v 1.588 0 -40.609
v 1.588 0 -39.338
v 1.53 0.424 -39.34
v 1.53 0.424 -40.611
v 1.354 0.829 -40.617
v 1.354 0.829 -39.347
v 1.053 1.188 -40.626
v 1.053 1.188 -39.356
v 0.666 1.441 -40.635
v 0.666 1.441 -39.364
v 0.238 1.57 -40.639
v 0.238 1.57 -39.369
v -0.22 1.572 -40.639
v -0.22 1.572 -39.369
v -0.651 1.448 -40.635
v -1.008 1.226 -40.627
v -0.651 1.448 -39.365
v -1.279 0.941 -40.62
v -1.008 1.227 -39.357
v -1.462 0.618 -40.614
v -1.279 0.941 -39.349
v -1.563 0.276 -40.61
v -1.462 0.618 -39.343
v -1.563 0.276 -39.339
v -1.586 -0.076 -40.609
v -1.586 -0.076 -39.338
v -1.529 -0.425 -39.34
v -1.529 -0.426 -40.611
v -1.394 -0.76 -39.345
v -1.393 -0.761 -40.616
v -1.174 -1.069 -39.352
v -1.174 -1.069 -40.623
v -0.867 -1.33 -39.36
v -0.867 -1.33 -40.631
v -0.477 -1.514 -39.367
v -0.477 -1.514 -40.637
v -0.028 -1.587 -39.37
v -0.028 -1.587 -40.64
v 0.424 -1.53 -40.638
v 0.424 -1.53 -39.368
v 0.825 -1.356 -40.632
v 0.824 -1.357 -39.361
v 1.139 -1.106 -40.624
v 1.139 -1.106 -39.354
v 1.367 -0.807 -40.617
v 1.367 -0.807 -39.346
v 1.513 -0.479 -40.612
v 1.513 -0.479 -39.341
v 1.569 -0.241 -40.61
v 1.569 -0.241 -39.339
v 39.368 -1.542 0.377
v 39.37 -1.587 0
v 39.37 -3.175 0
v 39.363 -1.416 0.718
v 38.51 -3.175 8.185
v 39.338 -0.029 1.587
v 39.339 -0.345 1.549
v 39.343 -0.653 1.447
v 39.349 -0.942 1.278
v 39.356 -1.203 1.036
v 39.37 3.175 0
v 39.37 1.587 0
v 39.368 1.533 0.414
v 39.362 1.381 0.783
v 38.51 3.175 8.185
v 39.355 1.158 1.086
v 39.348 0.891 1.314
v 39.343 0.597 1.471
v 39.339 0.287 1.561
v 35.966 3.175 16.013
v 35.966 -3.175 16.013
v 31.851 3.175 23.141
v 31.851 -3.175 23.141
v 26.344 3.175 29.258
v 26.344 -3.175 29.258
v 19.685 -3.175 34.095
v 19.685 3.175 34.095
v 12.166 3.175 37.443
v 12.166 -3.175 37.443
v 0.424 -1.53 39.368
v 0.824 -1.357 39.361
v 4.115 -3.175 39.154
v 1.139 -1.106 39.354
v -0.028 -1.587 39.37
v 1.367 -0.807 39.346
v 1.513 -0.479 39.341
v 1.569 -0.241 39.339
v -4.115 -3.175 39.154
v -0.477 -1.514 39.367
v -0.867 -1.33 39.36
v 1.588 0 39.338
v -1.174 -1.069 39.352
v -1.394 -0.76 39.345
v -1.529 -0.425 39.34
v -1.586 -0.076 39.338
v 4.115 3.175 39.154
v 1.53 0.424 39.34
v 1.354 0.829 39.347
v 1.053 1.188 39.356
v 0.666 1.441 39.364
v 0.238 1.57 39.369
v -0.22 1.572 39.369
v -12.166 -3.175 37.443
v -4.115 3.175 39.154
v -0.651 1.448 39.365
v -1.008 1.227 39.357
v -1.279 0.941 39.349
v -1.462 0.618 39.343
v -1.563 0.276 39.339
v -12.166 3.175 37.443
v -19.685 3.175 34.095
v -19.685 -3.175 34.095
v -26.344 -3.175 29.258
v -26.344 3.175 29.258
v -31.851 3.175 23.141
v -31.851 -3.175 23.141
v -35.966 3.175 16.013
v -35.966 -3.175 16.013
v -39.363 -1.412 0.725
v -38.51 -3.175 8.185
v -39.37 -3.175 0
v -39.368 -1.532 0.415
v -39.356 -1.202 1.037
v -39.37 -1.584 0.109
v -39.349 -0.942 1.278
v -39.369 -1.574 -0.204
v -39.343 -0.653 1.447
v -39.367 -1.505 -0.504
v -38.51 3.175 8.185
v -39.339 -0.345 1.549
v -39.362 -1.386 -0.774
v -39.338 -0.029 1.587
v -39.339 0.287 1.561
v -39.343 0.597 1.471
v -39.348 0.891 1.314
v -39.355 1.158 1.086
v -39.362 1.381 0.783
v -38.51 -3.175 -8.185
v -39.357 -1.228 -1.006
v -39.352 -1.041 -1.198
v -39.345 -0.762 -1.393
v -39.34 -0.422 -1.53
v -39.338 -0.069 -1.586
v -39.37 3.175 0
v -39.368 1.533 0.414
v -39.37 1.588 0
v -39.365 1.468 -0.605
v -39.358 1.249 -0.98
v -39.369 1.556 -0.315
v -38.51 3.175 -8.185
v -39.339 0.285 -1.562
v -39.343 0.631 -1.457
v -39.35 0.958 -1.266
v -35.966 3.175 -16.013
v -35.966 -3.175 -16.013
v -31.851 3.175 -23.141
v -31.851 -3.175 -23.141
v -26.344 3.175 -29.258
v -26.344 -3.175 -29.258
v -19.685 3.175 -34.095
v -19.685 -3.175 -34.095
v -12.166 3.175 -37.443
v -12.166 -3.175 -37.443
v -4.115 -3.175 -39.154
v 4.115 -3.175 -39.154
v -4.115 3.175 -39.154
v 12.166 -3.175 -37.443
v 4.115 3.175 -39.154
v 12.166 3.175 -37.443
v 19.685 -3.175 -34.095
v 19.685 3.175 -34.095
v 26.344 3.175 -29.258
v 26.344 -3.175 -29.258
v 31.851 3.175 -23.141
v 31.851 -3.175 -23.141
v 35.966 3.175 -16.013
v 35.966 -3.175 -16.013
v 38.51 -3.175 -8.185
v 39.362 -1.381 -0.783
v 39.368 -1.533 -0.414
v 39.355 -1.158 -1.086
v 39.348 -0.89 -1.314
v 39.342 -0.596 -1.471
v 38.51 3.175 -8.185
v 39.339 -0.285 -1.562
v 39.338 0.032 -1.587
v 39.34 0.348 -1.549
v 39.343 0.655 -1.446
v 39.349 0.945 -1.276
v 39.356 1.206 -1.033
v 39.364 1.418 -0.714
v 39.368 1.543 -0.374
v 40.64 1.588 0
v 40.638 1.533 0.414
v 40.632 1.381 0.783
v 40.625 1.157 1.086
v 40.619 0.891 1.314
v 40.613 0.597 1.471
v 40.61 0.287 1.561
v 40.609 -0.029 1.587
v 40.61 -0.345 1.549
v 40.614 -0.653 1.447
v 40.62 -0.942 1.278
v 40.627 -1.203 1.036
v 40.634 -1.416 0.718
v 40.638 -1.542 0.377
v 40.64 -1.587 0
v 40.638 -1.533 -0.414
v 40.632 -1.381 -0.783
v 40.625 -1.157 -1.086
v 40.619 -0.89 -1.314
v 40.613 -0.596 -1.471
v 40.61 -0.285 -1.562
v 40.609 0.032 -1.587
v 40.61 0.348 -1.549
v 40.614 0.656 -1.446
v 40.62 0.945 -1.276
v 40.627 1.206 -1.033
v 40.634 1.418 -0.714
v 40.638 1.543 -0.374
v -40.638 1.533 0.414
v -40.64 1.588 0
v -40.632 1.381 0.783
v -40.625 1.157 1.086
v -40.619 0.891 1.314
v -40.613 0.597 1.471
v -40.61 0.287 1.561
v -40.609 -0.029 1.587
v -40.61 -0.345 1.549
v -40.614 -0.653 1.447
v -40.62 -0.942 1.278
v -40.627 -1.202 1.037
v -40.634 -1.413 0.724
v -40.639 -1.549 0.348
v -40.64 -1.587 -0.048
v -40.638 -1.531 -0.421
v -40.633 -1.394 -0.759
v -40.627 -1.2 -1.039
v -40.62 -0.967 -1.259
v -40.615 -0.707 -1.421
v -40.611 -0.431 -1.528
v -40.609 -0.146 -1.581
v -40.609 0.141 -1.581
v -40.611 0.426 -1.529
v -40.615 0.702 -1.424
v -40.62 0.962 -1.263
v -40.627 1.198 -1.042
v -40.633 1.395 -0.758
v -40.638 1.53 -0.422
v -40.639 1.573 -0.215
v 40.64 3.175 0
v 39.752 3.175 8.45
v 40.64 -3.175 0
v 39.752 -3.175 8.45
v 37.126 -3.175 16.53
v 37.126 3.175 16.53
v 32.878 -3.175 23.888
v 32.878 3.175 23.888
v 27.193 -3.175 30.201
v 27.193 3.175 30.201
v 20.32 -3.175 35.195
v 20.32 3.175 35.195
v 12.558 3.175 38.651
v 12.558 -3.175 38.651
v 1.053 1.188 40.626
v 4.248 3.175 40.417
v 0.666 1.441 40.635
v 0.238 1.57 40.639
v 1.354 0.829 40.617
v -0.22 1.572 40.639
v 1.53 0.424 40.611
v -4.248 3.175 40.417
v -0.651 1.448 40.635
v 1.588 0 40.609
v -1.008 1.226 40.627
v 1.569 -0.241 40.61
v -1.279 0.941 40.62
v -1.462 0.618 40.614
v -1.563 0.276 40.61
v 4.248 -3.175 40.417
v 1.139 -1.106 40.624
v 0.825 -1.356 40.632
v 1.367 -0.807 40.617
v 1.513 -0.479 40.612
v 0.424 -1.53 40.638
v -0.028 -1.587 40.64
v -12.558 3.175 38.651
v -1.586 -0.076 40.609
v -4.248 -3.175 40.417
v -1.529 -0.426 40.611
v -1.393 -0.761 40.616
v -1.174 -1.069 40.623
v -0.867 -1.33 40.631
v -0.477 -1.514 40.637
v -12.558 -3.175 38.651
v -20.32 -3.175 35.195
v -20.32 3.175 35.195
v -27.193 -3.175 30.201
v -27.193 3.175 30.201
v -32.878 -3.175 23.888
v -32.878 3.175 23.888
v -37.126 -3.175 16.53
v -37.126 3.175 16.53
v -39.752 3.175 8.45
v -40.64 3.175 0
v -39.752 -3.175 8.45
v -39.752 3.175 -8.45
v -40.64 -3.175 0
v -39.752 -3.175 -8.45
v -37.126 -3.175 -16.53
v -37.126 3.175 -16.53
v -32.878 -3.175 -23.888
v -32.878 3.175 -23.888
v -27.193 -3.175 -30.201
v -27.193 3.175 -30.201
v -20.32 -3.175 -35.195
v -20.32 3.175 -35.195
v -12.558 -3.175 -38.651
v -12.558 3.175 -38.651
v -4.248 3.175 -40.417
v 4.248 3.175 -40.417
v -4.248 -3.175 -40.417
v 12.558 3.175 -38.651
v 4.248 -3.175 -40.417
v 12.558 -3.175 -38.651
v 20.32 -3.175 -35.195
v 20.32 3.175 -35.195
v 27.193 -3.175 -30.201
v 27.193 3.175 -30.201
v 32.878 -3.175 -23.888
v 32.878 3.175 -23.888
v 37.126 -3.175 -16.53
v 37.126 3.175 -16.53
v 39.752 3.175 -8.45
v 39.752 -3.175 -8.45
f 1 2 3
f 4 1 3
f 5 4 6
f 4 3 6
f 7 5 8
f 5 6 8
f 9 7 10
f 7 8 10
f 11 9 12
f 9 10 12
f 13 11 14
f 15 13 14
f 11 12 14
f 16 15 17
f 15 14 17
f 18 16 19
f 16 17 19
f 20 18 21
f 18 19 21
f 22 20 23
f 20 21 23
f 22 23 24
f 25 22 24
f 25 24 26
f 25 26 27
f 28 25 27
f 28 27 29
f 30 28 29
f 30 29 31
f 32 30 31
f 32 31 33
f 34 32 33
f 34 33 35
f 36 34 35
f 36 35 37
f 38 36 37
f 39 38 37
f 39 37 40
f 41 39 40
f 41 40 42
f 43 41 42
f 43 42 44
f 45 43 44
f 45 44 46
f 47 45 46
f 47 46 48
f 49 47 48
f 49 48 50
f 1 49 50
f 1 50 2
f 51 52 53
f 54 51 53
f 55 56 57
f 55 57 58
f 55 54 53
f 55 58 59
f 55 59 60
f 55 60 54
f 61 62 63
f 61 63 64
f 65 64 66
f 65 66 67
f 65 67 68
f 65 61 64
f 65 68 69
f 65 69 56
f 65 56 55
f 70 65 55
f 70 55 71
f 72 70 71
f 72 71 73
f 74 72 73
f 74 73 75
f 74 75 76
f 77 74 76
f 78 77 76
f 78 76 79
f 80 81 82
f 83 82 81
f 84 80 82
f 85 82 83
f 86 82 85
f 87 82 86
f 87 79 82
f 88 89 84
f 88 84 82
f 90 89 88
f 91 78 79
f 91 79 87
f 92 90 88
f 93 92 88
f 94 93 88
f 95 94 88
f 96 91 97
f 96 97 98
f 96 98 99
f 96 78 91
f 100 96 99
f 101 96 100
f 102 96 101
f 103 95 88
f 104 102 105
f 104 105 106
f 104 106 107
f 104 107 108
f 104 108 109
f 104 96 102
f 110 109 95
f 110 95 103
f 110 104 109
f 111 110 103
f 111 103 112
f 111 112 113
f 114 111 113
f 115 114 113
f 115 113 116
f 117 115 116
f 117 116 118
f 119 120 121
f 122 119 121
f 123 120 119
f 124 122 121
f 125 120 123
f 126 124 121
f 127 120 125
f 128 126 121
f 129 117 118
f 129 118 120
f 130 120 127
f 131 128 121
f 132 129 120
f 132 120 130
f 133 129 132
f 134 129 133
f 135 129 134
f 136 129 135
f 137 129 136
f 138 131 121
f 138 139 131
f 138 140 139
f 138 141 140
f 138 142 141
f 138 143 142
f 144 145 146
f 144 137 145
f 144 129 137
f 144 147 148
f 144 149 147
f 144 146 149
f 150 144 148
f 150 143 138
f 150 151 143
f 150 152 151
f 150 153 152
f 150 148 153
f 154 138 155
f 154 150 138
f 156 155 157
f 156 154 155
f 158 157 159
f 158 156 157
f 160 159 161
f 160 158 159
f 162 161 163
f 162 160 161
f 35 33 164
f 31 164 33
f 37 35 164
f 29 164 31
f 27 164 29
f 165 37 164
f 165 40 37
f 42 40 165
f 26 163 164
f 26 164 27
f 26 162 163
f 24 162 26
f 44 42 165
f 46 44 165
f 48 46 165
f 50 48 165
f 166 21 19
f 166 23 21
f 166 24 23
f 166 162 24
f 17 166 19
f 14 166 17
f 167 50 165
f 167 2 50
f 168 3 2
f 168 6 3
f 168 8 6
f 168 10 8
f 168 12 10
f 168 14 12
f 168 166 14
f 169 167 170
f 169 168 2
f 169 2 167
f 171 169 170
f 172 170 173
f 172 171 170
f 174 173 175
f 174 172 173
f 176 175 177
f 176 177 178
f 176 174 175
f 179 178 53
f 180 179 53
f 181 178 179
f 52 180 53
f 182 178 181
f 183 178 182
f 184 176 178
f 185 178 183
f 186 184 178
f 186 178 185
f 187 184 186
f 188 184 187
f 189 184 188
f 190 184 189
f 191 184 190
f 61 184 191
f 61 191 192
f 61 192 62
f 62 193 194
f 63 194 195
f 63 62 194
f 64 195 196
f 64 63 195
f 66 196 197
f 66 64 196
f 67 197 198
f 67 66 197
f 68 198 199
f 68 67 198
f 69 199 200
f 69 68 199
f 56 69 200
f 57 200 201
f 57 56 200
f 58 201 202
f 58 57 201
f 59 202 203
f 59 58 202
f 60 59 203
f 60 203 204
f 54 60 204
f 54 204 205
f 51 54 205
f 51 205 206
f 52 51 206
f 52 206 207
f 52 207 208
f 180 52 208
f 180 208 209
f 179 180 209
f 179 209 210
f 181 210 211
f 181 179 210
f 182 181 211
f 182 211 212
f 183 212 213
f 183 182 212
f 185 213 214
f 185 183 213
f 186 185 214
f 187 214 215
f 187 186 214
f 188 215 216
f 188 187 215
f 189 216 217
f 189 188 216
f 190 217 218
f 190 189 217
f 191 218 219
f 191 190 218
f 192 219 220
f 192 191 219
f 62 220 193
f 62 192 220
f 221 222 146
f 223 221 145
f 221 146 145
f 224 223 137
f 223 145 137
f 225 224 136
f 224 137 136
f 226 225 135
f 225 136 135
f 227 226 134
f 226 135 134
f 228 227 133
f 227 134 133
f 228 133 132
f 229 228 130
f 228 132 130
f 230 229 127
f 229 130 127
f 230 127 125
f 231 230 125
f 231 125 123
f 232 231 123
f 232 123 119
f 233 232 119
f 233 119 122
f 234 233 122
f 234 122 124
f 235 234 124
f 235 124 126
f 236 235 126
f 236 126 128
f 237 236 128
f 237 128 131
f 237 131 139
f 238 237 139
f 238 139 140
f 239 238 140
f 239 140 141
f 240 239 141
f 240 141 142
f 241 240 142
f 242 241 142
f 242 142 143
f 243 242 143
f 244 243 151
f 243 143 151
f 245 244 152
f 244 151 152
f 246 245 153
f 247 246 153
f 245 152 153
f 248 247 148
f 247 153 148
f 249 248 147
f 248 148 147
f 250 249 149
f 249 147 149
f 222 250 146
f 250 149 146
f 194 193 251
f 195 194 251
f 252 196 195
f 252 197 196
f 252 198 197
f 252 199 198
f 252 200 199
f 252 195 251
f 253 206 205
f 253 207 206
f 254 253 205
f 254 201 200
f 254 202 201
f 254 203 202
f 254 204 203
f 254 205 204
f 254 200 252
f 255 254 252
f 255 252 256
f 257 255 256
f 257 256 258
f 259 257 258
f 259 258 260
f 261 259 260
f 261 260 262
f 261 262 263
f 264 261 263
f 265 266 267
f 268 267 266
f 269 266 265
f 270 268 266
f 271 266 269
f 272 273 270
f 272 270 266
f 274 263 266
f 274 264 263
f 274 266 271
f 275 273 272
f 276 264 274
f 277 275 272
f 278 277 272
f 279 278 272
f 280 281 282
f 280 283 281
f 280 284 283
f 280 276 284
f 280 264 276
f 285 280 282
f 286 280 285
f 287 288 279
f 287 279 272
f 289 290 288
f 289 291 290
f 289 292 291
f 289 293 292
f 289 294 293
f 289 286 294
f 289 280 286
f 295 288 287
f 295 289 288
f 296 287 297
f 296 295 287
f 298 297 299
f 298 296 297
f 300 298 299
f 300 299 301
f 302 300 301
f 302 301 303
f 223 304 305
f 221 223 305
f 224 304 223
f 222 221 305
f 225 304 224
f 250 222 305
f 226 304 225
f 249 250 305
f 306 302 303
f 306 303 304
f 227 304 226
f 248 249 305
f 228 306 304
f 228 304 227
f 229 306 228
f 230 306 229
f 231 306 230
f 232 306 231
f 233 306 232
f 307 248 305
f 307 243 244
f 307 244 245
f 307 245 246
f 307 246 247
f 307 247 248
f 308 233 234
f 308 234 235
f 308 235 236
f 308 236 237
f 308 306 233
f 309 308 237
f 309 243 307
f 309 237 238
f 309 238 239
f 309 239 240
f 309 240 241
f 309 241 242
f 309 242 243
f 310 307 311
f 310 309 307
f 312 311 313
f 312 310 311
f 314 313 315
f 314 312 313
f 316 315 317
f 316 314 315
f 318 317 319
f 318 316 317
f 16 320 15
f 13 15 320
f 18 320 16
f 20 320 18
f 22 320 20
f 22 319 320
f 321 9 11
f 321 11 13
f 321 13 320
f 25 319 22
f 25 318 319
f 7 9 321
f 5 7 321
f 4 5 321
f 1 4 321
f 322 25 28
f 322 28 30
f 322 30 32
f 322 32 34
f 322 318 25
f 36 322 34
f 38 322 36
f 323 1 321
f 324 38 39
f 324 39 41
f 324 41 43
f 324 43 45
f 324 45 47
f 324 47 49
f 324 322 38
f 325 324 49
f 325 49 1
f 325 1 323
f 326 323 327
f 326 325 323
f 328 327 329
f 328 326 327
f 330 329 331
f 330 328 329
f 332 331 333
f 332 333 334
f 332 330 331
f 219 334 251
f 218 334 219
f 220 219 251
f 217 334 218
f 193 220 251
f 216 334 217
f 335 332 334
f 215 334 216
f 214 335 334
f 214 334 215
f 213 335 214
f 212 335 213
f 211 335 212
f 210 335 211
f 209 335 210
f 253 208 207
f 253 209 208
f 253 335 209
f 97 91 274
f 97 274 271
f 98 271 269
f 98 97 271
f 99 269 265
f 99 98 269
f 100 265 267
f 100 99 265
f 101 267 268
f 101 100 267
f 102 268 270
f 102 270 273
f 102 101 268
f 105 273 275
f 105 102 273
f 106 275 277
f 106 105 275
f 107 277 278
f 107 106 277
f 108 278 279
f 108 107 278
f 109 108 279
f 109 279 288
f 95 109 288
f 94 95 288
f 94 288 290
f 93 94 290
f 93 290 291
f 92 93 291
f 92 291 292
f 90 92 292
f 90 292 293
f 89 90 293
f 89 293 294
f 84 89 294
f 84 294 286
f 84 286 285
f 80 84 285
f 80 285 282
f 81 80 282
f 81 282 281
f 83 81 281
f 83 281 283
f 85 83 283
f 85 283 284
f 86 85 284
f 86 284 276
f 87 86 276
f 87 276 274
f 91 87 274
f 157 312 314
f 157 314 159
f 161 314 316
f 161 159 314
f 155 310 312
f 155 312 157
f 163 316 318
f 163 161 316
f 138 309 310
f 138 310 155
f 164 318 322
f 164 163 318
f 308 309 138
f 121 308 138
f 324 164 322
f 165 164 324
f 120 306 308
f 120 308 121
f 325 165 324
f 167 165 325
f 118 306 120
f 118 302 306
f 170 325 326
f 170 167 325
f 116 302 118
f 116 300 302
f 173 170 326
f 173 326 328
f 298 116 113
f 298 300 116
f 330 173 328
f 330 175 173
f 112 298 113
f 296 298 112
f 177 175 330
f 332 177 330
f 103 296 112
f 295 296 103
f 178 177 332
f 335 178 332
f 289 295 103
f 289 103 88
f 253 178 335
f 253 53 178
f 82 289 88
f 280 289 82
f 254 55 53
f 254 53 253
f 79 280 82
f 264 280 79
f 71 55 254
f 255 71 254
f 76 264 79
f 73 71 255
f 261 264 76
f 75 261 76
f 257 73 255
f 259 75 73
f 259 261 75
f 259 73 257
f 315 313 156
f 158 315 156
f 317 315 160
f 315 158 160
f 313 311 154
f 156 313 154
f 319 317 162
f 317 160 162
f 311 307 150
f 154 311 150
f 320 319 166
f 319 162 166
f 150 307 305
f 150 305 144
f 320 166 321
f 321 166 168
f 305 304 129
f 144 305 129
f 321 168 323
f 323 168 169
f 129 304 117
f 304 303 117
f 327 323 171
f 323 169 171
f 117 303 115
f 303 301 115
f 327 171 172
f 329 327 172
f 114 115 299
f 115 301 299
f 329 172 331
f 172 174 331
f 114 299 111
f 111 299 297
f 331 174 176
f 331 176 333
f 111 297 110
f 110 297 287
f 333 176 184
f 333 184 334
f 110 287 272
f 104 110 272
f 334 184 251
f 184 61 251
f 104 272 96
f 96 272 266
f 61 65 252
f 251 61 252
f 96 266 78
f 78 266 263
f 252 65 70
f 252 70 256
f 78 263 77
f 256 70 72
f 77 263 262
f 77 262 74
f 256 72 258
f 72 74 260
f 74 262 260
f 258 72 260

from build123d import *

# Parameters (mm, degrees)
F0_R          = 40.64
F0_R_2        = 39.37
F1_DEPTH      = 3.175
F2_R          = 1.5875
F4_DEPTH      = 40.641
F4_DEPTH_BACK = 49.77658
F3_R          = 1.5875
F5_DEPTH      = 40.6410001
F5_DEPTH_BACK = 44.7205


with BuildPart() as f1:
    # F0 (on Front) → F1 (new body, symmetric)
    with BuildSketch(Plane.XZ):
        Circle(F0_R)
        Circle(F0_R_2, mode=Mode.SUBTRACT)
    extrude(amount=F1_DEPTH, both=True)

    # F2 (on Top) → F4 (cut, two sides)
    with BuildSketch(Plane.XY) as f4_sk:
        Circle(F2_R)
    extrude(amount=-F4_DEPTH, mode=Mode.SUBTRACT)
    extrude(f4_sk.sketch, amount=F4_DEPTH_BACK, mode=Mode.SUBTRACT)

    # F3 (on Right) → F5 (cut, two sides)
    with BuildSketch(Plane.YZ) as f5_sk:
        Circle(F3_R)
    extrude(amount=-F5_DEPTH, mode=Mode.SUBTRACT)
    extrude(f5_sk.sketch, amount=F5_DEPTH_BACK, mode=Mode.SUBTRACT)


solid = f1.part
